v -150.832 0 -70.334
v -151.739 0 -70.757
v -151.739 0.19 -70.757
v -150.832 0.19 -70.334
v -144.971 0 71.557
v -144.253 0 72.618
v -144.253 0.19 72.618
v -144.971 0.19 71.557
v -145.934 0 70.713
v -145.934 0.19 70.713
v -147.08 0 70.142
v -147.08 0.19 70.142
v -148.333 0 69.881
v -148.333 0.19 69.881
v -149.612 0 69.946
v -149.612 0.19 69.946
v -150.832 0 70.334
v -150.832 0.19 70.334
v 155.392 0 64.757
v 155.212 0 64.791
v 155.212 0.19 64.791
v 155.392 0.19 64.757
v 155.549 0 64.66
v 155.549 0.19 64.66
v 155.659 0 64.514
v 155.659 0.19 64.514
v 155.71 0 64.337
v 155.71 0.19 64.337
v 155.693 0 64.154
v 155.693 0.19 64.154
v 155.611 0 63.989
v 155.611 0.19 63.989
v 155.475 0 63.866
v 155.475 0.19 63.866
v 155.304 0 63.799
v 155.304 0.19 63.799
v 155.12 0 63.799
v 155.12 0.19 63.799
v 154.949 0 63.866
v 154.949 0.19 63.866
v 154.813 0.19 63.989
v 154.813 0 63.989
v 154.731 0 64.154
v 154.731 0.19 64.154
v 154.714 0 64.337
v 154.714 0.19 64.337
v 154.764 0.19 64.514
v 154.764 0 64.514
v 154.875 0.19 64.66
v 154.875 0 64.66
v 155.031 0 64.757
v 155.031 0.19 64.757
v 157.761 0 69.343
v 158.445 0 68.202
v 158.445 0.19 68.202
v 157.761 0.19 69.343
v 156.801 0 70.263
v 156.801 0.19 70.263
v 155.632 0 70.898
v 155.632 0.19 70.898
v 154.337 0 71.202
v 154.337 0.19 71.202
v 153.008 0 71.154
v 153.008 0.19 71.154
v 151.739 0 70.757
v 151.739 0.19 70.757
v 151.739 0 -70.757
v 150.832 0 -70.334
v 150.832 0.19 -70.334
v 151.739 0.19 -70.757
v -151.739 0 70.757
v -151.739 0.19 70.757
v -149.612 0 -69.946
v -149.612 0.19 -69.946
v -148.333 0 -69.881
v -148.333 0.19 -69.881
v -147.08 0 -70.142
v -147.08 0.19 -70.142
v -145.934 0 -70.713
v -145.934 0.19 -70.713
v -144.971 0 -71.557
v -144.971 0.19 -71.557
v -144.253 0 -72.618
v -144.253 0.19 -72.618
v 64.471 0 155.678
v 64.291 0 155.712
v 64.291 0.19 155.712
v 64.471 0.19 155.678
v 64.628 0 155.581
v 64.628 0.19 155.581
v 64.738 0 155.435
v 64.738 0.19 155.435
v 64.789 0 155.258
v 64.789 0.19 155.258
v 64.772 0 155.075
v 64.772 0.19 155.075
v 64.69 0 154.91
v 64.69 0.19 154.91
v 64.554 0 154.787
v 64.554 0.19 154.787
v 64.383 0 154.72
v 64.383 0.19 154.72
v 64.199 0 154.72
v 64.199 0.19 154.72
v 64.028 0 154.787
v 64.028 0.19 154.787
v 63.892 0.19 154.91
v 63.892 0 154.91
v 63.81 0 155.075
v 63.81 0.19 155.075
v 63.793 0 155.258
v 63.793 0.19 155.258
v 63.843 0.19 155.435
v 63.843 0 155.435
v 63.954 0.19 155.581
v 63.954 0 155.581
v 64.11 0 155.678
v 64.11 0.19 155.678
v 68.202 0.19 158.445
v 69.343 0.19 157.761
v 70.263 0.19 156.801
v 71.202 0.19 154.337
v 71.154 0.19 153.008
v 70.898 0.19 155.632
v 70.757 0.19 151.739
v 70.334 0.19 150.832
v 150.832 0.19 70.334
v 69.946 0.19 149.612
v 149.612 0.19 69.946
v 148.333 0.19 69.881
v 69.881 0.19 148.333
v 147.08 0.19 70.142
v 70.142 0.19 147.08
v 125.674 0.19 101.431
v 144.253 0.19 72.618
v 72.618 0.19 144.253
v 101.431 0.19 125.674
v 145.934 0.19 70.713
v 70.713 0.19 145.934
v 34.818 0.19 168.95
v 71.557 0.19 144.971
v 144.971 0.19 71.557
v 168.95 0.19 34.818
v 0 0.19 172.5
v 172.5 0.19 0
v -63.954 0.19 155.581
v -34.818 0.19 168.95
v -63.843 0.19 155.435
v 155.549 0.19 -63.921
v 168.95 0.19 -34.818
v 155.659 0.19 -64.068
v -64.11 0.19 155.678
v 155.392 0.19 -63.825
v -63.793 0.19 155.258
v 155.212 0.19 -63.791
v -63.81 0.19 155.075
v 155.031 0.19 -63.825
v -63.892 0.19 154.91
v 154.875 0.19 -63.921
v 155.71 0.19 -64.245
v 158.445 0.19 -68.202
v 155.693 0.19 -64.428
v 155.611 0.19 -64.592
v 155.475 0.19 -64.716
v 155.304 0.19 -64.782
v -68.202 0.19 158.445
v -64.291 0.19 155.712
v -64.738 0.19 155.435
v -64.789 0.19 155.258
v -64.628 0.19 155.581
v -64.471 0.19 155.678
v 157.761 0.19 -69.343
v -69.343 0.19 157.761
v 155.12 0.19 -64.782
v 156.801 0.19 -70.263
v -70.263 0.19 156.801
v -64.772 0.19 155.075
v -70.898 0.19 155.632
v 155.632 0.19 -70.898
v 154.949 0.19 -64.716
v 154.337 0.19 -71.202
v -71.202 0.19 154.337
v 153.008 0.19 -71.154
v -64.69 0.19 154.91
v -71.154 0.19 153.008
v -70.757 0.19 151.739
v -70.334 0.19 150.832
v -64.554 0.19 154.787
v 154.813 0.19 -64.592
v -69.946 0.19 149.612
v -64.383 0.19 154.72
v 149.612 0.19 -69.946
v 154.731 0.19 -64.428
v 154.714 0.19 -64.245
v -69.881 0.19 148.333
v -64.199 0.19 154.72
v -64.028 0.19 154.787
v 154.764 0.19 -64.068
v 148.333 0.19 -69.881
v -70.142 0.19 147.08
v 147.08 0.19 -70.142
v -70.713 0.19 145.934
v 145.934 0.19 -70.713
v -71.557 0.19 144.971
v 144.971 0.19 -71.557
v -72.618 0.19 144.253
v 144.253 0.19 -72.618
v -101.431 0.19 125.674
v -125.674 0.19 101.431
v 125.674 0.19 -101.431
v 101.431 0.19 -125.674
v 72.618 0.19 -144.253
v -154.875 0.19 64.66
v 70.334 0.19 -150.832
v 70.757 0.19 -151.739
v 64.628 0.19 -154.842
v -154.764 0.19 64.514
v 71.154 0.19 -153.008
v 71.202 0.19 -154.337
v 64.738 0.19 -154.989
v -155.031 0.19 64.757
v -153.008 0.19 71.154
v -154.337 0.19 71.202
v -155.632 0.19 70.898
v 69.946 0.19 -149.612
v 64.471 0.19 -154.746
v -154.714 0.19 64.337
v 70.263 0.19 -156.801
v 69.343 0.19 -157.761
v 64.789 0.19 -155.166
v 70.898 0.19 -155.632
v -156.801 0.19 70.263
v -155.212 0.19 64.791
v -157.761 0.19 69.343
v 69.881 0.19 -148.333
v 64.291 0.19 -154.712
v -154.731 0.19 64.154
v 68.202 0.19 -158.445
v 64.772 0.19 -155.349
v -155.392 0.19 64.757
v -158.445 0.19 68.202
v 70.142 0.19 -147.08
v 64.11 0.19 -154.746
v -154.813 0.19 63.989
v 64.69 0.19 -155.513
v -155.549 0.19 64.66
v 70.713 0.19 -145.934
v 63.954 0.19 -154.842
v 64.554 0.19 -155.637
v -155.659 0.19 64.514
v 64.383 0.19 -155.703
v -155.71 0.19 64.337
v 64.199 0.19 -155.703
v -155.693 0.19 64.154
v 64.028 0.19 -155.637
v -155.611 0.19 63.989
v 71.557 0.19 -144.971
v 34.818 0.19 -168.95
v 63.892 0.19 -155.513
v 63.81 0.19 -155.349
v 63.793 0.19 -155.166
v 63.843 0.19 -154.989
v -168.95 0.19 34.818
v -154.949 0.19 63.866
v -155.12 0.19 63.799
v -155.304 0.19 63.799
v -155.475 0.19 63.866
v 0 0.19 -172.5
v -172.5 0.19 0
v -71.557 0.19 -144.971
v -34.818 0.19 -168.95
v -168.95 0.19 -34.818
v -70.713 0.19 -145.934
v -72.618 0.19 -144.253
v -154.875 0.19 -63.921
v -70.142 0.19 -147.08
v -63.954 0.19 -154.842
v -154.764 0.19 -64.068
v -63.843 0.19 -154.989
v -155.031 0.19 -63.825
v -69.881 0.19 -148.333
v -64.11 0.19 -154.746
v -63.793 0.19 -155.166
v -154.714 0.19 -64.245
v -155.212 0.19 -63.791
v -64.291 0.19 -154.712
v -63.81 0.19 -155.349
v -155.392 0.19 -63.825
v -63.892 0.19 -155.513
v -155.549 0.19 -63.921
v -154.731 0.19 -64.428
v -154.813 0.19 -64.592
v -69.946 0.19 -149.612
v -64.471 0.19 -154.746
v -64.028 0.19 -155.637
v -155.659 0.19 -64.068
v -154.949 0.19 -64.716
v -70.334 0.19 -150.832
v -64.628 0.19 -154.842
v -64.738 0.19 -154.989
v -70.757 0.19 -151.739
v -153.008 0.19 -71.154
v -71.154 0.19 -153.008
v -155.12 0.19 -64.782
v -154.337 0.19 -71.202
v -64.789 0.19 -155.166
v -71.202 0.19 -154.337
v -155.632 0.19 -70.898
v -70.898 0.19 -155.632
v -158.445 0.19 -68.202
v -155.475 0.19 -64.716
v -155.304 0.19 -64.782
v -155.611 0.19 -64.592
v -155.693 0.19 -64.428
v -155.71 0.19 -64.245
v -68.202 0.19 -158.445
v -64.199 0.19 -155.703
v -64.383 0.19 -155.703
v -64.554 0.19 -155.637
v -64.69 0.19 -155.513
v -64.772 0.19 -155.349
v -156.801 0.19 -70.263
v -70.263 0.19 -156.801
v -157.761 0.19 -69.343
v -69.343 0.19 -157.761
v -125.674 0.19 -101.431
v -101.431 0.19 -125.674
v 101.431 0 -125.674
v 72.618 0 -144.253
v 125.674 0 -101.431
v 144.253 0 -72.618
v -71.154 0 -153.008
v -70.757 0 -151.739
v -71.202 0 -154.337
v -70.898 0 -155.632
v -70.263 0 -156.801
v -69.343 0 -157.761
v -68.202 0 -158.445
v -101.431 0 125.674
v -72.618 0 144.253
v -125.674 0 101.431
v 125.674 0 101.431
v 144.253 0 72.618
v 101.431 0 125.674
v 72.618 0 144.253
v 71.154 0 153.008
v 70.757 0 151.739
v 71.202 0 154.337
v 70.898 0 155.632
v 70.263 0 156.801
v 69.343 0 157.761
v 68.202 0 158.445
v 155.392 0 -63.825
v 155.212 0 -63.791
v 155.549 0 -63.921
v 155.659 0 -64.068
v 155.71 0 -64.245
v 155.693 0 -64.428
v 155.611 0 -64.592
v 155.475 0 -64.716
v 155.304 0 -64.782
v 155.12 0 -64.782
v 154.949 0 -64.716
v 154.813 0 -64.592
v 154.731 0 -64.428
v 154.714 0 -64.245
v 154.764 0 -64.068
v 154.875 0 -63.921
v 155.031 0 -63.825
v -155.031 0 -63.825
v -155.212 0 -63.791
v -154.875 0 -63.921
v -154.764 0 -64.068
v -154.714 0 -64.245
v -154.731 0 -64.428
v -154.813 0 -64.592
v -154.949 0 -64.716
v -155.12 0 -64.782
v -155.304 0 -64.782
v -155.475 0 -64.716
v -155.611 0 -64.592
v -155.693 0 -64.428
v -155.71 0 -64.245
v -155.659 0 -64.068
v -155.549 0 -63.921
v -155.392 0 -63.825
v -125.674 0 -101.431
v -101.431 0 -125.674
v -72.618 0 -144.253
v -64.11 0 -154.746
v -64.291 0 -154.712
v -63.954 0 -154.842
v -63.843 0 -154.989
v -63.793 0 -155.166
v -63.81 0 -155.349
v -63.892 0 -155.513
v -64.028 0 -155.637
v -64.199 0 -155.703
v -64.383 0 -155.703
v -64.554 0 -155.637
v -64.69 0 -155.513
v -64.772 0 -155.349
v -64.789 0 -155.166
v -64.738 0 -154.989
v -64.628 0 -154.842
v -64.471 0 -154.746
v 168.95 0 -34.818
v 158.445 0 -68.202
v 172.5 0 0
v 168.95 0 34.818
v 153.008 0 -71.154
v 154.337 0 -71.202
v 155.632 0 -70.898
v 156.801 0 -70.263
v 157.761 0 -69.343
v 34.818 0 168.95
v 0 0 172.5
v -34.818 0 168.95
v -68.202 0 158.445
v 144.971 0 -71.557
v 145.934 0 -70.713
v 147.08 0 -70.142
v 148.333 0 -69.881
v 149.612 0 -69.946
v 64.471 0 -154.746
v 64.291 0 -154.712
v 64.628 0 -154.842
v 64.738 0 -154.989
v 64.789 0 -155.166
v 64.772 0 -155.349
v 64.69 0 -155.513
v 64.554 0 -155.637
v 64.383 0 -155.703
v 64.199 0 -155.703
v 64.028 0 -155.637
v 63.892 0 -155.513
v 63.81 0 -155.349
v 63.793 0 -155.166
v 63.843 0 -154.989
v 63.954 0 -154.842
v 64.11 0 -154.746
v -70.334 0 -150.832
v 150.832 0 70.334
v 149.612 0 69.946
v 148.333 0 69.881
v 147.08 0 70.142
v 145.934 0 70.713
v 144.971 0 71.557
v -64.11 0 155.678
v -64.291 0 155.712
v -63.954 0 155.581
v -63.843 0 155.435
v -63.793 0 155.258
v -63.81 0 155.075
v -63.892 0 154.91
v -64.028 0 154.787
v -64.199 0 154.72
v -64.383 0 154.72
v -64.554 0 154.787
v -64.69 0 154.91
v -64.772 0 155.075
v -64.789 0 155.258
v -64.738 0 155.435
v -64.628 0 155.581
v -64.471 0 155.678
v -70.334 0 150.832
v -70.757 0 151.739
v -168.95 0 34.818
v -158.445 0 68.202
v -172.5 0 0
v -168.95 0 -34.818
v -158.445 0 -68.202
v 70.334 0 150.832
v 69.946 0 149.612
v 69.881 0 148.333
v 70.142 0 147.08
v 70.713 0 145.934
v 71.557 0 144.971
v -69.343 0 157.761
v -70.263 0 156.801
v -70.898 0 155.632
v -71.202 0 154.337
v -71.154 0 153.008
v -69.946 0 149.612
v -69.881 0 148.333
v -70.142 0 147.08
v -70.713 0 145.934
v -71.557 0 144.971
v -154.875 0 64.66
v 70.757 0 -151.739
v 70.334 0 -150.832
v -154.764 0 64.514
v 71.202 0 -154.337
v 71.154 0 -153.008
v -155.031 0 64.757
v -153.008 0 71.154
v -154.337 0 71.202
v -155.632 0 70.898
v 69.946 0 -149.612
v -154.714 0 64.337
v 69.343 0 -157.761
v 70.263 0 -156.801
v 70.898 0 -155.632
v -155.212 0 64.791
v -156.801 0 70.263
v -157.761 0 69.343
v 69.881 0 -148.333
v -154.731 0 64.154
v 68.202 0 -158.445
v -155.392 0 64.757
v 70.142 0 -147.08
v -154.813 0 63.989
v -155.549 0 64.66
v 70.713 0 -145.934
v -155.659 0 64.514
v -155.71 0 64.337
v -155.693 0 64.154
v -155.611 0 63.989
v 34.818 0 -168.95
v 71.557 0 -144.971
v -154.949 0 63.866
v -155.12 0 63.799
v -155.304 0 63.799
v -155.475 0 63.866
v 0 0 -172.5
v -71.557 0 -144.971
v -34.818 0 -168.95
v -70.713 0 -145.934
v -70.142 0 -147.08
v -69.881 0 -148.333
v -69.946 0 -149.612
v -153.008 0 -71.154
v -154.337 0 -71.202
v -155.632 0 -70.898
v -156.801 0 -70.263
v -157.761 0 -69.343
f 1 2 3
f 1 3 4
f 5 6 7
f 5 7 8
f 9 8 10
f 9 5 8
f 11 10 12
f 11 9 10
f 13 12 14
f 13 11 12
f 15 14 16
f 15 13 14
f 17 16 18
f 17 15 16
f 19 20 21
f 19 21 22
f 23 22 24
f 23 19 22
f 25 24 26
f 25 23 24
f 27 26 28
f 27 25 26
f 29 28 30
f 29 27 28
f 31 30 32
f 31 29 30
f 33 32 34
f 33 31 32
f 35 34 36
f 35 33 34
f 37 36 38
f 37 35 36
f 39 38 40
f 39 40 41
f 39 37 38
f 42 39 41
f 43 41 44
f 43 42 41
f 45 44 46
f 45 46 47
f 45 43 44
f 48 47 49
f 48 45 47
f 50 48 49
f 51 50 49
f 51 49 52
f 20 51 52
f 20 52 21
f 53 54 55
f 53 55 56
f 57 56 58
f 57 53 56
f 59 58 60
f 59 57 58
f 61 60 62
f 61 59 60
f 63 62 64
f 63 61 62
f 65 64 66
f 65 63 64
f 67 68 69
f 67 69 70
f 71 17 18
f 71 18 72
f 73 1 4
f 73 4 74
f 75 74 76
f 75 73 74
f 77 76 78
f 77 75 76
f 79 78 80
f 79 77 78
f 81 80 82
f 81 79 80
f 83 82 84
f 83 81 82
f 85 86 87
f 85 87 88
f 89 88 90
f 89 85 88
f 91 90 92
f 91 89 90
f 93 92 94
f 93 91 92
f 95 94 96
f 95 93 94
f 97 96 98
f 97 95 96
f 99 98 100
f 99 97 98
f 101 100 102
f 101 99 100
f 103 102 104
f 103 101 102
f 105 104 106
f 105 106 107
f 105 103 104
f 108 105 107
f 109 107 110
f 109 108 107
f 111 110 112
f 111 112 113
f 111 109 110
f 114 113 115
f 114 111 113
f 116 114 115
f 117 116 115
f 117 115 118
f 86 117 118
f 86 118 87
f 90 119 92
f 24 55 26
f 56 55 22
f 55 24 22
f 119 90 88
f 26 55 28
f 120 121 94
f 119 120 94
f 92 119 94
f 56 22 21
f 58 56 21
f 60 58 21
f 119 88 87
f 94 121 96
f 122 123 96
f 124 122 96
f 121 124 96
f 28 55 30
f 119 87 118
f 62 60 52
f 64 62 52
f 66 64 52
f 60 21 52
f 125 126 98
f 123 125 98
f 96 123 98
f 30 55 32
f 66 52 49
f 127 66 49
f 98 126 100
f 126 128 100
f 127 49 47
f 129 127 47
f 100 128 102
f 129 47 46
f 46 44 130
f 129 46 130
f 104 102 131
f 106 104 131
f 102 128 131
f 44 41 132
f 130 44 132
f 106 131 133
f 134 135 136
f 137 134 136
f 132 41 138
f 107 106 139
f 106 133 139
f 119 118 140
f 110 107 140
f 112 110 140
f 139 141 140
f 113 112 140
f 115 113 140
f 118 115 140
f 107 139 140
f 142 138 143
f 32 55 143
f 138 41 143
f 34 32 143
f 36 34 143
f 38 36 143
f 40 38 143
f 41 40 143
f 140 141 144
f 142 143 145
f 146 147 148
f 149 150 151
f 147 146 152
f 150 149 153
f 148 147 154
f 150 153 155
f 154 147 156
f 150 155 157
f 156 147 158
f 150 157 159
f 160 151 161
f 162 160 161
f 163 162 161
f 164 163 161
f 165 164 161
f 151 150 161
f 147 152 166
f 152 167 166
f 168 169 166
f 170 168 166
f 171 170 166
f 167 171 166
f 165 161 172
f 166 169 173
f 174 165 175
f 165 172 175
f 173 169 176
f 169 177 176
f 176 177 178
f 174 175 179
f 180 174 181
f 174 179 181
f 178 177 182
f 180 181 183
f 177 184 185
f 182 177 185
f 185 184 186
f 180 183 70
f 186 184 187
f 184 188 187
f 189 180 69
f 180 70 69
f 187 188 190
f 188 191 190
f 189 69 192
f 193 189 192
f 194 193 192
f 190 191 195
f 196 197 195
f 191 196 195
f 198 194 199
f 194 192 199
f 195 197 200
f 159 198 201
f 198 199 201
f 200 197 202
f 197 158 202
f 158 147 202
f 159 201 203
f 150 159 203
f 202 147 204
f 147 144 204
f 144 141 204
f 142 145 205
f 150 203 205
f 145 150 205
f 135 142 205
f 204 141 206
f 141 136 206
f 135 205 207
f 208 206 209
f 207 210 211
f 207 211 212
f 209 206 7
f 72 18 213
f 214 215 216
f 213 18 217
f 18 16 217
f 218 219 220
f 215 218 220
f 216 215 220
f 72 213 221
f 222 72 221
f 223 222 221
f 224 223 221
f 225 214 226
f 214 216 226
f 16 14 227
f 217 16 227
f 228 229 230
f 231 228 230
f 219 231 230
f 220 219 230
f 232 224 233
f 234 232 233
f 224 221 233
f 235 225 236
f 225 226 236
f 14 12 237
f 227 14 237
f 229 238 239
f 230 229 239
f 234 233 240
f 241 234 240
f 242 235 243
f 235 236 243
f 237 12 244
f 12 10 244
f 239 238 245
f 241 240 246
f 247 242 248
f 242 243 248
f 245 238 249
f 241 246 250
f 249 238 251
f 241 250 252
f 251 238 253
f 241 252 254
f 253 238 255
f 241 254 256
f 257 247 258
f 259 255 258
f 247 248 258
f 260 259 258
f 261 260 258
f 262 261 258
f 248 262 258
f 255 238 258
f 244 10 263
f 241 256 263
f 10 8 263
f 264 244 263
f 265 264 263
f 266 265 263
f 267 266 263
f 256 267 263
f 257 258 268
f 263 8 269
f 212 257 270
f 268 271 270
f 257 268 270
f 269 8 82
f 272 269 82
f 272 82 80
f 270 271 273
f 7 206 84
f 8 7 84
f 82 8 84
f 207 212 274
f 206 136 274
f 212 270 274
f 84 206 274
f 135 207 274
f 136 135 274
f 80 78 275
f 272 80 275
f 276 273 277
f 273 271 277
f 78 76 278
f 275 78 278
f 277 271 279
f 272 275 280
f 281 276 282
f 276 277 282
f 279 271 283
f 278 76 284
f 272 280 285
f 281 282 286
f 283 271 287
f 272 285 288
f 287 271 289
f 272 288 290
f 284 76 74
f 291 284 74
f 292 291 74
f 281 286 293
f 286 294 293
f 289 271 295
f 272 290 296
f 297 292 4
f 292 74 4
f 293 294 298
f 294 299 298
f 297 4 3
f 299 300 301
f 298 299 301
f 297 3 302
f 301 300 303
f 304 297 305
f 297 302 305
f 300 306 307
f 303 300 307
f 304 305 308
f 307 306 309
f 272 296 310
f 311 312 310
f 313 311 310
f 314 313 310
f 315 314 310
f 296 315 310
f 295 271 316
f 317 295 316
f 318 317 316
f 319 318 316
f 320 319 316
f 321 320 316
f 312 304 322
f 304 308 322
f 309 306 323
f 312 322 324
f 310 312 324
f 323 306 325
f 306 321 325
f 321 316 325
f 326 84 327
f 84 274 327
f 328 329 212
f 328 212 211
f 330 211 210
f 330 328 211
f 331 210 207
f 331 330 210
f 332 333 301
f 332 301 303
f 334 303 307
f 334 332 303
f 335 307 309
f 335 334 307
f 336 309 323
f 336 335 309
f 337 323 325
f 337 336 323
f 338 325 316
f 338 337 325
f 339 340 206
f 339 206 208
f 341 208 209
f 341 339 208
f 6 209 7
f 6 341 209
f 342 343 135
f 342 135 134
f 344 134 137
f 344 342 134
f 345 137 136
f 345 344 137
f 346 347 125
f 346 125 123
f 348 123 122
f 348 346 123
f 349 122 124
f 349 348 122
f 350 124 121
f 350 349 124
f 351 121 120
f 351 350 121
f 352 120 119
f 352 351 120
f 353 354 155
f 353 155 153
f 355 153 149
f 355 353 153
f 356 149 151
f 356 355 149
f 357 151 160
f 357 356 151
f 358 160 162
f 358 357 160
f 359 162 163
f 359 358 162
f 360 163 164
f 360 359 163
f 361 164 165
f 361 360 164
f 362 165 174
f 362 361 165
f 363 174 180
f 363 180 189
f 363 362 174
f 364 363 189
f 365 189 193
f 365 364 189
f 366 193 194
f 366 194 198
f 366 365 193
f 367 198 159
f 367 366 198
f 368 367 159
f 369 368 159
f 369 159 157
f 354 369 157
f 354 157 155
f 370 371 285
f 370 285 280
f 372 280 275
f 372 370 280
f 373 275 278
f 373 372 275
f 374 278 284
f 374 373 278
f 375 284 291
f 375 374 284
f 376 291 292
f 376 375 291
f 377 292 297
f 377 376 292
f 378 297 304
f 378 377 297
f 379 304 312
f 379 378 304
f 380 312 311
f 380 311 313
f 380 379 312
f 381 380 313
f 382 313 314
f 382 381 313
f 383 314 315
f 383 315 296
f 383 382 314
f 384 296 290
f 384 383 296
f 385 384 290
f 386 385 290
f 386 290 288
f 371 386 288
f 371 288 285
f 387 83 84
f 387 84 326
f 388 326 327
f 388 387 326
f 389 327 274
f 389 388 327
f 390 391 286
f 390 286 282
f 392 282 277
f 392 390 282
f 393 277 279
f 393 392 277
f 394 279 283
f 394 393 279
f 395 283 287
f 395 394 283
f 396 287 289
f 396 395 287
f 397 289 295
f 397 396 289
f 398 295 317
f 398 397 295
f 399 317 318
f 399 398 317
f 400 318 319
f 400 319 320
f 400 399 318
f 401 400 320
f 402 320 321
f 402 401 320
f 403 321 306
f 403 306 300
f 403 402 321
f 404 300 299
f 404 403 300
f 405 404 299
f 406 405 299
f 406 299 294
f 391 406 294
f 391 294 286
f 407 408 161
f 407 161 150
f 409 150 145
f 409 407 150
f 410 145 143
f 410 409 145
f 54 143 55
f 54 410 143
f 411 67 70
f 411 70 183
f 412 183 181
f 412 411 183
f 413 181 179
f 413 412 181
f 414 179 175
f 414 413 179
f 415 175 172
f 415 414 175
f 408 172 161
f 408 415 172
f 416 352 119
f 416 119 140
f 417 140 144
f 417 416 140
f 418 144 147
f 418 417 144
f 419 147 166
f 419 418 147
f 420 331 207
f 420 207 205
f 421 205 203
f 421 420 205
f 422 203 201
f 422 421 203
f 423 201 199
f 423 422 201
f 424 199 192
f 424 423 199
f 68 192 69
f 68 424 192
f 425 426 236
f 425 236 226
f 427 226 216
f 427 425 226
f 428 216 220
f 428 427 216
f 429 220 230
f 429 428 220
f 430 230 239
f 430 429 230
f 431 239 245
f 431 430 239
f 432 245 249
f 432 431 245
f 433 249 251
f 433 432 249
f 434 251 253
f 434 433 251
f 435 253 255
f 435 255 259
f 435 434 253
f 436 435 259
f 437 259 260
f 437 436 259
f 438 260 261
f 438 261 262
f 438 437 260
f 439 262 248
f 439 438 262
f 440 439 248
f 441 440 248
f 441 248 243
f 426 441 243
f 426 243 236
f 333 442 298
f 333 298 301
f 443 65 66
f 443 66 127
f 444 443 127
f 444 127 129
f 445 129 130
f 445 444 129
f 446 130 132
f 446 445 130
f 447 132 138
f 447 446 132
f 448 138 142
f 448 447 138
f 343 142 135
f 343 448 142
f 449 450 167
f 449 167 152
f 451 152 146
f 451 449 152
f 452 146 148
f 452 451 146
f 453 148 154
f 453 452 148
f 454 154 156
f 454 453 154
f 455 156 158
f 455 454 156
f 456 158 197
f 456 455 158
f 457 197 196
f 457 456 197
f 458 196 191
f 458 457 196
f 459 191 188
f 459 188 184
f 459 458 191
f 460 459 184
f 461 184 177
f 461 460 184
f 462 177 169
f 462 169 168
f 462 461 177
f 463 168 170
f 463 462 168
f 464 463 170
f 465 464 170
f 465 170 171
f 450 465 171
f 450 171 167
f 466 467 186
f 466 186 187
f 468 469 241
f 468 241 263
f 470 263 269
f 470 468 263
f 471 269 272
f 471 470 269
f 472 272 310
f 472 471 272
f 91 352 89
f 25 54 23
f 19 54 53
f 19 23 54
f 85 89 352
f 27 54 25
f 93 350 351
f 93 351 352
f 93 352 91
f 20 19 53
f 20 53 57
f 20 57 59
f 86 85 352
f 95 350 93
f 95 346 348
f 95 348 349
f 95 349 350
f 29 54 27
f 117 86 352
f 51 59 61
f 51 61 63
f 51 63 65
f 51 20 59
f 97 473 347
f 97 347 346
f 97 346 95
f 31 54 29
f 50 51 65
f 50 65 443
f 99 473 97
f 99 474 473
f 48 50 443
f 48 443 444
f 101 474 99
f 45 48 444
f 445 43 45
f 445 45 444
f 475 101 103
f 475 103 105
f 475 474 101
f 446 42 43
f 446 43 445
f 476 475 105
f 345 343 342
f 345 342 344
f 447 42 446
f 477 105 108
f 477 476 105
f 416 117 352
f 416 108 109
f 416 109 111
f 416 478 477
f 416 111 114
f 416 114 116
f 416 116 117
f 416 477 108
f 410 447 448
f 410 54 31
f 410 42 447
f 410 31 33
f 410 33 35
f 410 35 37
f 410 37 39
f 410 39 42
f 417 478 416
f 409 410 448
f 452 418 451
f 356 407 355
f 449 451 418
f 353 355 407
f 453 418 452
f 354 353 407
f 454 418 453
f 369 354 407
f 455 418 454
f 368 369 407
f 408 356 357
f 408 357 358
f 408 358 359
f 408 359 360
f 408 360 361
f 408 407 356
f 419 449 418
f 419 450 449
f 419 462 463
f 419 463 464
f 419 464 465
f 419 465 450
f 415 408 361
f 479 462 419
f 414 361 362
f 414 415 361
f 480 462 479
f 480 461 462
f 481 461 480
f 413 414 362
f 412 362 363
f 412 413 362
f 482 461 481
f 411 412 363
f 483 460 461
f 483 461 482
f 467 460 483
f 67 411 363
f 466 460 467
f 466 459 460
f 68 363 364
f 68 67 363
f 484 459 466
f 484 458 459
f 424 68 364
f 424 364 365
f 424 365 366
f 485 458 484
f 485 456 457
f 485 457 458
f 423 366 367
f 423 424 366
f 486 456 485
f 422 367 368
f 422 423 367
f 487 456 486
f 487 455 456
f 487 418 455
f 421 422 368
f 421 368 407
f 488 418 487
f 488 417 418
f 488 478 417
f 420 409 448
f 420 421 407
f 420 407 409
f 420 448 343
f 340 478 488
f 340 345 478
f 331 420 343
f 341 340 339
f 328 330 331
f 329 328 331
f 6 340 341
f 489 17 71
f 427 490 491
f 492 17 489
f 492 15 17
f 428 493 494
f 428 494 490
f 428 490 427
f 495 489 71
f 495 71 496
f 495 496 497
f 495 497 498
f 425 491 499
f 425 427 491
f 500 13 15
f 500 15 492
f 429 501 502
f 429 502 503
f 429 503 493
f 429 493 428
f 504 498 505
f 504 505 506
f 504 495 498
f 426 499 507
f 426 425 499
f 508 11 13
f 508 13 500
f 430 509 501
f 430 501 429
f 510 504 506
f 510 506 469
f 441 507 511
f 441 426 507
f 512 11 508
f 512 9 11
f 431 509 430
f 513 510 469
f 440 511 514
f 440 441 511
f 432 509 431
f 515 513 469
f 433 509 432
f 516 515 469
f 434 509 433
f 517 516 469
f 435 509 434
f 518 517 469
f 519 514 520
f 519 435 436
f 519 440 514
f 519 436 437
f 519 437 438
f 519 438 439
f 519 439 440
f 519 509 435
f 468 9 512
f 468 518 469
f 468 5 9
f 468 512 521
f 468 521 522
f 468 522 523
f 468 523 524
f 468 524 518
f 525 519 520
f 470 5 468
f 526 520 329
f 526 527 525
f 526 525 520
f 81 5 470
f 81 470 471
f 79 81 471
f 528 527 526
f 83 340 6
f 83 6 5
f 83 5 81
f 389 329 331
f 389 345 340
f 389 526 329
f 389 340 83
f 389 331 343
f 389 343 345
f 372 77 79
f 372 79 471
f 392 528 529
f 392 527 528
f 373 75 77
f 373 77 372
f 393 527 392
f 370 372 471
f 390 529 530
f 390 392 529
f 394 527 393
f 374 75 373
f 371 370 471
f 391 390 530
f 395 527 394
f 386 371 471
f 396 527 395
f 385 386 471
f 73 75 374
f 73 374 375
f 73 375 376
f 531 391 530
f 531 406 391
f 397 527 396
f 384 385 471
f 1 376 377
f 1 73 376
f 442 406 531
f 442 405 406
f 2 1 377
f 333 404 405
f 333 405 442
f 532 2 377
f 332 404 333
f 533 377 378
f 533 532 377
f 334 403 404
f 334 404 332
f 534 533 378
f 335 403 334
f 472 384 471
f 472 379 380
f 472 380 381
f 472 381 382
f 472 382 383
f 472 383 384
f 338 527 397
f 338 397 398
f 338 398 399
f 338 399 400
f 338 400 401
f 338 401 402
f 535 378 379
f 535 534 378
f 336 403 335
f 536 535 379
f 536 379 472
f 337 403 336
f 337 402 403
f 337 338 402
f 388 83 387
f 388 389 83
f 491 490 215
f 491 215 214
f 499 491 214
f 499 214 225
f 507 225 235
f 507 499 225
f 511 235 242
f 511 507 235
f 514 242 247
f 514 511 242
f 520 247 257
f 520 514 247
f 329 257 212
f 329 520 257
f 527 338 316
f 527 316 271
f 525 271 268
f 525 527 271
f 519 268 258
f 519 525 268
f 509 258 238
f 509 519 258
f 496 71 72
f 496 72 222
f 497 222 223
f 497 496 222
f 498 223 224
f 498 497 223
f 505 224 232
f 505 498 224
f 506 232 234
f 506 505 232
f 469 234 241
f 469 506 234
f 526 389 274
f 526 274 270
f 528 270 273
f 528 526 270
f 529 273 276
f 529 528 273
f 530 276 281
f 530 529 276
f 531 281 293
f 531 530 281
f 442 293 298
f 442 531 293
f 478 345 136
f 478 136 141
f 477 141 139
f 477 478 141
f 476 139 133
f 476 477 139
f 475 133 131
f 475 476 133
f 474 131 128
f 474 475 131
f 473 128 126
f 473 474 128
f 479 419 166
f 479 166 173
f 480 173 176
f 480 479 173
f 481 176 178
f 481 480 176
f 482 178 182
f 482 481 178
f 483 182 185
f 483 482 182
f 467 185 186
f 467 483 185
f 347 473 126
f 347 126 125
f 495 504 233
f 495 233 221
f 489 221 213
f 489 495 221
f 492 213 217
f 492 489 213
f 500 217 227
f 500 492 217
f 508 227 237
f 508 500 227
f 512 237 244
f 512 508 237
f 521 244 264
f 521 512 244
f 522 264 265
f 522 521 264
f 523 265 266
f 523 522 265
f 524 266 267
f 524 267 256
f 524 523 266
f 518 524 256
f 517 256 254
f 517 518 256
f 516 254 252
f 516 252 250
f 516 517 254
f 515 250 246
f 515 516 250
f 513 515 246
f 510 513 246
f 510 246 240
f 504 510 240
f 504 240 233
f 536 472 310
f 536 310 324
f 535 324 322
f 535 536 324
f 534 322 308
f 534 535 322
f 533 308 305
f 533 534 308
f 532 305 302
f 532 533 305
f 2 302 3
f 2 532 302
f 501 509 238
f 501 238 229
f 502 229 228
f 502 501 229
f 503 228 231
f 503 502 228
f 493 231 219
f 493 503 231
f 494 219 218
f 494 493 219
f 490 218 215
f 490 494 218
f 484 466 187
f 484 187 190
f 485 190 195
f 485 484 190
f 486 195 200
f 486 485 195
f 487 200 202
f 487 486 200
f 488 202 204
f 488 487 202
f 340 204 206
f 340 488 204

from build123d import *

# Parameters (mm, degrees)
SKETCH1_R           = 0.5
BOSS_EXTRUDE1_DEPTH = 0.19


with BuildPart() as part:
    # Sketch1 → Boss-Extrude1 (new body)
    with BuildSketch(Plane(origin=(0, 0, 0), x_dir=(1, 0, 0), z_dir=(0, 1, 0))):
        with BuildLine():
            Line((70.757013136, 151.738904346), (70.334205326, 150.83219007))
            ThreePointArc((70.334205326, 150.83219007), (70.142130859, 147.07974632), (72.617523713, 144.253059759))
            ThreePointArc((72.617523713, 144.253059759), (114.197745162, 114.197745162), (144.253059759, 72.617523713))
            ThreePointArc((144.253059759, 72.617523713), (147.07974632, 70.142130859), (150.83219007, 70.334205326))
            Line((150.83219007, 70.334205326), (151.738904346, 70.757013136))
            ThreePointArc((151.738904346, 70.757013136), (155.63203997, 70.897887093), (158.44459254, 68.202354028))
            ThreePointArc((158.44459254, 68.202354028), (172.5, 0), (158.44459254, -68.202354028))
            ThreePointArc((158.44459254, -68.202354028), (155.63203997, -70.897887093), (151.738904346, -70.757013136))
            Line((151.738904346, -70.757013136), (150.83219007, -70.334205326))
            ThreePointArc((150.83219007, -70.334205326), (147.07974632, -70.142130859), (144.253059759, -72.617523713))
            ThreePointArc((144.253059759, -72.617523713), (114.197745162, -114.197745162), (72.617523713, -144.253059759))
            ThreePointArc((72.617523713, -144.253059759), (70.142130859, -147.07974632), (70.334205326, -150.83219007))
            Line((70.334205326, -150.83219007), (70.757013136, -151.738904346))
            ThreePointArc((70.757013136, -151.738904346), (70.897887093, -155.63203997), (68.202354028, -158.44459254))
            ThreePointArc((68.202354028, -158.44459254), (0, -172.5), (-68.202354028, -158.44459254))
            ThreePointArc((-68.202354028, -158.44459254), (-70.897887093, -155.63203997), (-70.757013136, -151.738904346))
            Line((-70.757013136, -151.738904346), (-70.334205326, -150.83219007))
            ThreePointArc((-70.334205326, -150.83219007), (-70.142130859, -147.07974632), (-72.617523713, -144.253059759))
            ThreePointArc((-72.617523713, -144.253059759), (-114.197745162, -114.197745162), (-144.253059759, -72.617523713))
            ThreePointArc((-144.253059759, -72.617523713), (-147.07974632, -70.142130859), (-150.83219007, -70.334205326))
            Line((-150.83219007, -70.334205326), (-151.738904346, -70.757013136))
            ThreePointArc((-151.738904346, -70.757013136), (-155.63203997, -70.897887093), (-158.44459254, -68.202354028))
            ThreePointArc((-158.44459254, -68.202354028), (-172.5, 0), (-158.44459254, 68.202354028))
            ThreePointArc((-158.44459254, 68.202354028), (-155.63203997, 70.897887093), (-151.738904346, 70.757013136))
            Line((-151.738904346, 70.757013136), (-150.83219007, 70.334205326))
            ThreePointArc((-150.83219007, 70.334205326), (-147.07974632, 70.142130859), (-144.253059759, 72.617523713))
            ThreePointArc((-144.253059759, 72.617523713), (-114.197745162, 114.197745162), (-72.617523713, 144.253059759))
            ThreePointArc((-72.617523713, 144.253059759), (-70.142130859, 147.07974632), (-70.334205326, 150.83219007))
            Line((-70.334205326, 150.83219007), (-70.757013136, 151.738904346))
            ThreePointArc((-70.757013136, 151.738904346), (-70.897887093, 155.63203997), (-68.202354028, 158.44459254))
            ThreePointArc((-68.202354028, 158.44459254), (0, 172.5), (68.202354028, 158.44459254))
            ThreePointArc((68.202354028, 158.44459254), (70.897887093, 155.63203997), (70.757013136, 151.738904346))
        make_face()
        with Locations(Location((-64.290816637, 155.211761462, 0), (0, 0, 270))):
            Circle(SKETCH1_R, mode=Mode.SUBTRACT)
        with Locations(Location((64.290816637, 155.211761462, 0), (0, 0, 270))):
            Circle(SKETCH1_R, mode=Mode.SUBTRACT)
        with Locations(Location((155.211761462, 64.290816637, 0), (0, 0, 270))):
            Circle(SKETCH1_R, mode=Mode.SUBTRACT)
        with Locations(Location((155.211761462, -64.290816637, 0), (0, 0, 270))):
            Circle(SKETCH1_R, mode=Mode.SUBTRACT)
        with Locations(Location((64.290816637, -155.211761462, 0), (0, 0, 270))):
            Circle(SKETCH1_R, mode=Mode.SUBTRACT)
        with Locations(Location((-64.290816637, -155.211761462, 0), (0, 0, 270))):
            Circle(SKETCH1_R, mode=Mode.SUBTRACT)
        with Locations(Location((-155.211761462, -64.290816637, 0), (0, 0, 270))):
            Circle(SKETCH1_R, mode=Mode.SUBTRACT)
        with Locations(Location((-155.211761462, 64.290816637, 0), (0, 0, 270))):
            Circle(SKETCH1_R, mode=Mode.SUBTRACT)
    extrude(amount=BOSS_EXTRUDE1_DEPTH)


solid = part.part
